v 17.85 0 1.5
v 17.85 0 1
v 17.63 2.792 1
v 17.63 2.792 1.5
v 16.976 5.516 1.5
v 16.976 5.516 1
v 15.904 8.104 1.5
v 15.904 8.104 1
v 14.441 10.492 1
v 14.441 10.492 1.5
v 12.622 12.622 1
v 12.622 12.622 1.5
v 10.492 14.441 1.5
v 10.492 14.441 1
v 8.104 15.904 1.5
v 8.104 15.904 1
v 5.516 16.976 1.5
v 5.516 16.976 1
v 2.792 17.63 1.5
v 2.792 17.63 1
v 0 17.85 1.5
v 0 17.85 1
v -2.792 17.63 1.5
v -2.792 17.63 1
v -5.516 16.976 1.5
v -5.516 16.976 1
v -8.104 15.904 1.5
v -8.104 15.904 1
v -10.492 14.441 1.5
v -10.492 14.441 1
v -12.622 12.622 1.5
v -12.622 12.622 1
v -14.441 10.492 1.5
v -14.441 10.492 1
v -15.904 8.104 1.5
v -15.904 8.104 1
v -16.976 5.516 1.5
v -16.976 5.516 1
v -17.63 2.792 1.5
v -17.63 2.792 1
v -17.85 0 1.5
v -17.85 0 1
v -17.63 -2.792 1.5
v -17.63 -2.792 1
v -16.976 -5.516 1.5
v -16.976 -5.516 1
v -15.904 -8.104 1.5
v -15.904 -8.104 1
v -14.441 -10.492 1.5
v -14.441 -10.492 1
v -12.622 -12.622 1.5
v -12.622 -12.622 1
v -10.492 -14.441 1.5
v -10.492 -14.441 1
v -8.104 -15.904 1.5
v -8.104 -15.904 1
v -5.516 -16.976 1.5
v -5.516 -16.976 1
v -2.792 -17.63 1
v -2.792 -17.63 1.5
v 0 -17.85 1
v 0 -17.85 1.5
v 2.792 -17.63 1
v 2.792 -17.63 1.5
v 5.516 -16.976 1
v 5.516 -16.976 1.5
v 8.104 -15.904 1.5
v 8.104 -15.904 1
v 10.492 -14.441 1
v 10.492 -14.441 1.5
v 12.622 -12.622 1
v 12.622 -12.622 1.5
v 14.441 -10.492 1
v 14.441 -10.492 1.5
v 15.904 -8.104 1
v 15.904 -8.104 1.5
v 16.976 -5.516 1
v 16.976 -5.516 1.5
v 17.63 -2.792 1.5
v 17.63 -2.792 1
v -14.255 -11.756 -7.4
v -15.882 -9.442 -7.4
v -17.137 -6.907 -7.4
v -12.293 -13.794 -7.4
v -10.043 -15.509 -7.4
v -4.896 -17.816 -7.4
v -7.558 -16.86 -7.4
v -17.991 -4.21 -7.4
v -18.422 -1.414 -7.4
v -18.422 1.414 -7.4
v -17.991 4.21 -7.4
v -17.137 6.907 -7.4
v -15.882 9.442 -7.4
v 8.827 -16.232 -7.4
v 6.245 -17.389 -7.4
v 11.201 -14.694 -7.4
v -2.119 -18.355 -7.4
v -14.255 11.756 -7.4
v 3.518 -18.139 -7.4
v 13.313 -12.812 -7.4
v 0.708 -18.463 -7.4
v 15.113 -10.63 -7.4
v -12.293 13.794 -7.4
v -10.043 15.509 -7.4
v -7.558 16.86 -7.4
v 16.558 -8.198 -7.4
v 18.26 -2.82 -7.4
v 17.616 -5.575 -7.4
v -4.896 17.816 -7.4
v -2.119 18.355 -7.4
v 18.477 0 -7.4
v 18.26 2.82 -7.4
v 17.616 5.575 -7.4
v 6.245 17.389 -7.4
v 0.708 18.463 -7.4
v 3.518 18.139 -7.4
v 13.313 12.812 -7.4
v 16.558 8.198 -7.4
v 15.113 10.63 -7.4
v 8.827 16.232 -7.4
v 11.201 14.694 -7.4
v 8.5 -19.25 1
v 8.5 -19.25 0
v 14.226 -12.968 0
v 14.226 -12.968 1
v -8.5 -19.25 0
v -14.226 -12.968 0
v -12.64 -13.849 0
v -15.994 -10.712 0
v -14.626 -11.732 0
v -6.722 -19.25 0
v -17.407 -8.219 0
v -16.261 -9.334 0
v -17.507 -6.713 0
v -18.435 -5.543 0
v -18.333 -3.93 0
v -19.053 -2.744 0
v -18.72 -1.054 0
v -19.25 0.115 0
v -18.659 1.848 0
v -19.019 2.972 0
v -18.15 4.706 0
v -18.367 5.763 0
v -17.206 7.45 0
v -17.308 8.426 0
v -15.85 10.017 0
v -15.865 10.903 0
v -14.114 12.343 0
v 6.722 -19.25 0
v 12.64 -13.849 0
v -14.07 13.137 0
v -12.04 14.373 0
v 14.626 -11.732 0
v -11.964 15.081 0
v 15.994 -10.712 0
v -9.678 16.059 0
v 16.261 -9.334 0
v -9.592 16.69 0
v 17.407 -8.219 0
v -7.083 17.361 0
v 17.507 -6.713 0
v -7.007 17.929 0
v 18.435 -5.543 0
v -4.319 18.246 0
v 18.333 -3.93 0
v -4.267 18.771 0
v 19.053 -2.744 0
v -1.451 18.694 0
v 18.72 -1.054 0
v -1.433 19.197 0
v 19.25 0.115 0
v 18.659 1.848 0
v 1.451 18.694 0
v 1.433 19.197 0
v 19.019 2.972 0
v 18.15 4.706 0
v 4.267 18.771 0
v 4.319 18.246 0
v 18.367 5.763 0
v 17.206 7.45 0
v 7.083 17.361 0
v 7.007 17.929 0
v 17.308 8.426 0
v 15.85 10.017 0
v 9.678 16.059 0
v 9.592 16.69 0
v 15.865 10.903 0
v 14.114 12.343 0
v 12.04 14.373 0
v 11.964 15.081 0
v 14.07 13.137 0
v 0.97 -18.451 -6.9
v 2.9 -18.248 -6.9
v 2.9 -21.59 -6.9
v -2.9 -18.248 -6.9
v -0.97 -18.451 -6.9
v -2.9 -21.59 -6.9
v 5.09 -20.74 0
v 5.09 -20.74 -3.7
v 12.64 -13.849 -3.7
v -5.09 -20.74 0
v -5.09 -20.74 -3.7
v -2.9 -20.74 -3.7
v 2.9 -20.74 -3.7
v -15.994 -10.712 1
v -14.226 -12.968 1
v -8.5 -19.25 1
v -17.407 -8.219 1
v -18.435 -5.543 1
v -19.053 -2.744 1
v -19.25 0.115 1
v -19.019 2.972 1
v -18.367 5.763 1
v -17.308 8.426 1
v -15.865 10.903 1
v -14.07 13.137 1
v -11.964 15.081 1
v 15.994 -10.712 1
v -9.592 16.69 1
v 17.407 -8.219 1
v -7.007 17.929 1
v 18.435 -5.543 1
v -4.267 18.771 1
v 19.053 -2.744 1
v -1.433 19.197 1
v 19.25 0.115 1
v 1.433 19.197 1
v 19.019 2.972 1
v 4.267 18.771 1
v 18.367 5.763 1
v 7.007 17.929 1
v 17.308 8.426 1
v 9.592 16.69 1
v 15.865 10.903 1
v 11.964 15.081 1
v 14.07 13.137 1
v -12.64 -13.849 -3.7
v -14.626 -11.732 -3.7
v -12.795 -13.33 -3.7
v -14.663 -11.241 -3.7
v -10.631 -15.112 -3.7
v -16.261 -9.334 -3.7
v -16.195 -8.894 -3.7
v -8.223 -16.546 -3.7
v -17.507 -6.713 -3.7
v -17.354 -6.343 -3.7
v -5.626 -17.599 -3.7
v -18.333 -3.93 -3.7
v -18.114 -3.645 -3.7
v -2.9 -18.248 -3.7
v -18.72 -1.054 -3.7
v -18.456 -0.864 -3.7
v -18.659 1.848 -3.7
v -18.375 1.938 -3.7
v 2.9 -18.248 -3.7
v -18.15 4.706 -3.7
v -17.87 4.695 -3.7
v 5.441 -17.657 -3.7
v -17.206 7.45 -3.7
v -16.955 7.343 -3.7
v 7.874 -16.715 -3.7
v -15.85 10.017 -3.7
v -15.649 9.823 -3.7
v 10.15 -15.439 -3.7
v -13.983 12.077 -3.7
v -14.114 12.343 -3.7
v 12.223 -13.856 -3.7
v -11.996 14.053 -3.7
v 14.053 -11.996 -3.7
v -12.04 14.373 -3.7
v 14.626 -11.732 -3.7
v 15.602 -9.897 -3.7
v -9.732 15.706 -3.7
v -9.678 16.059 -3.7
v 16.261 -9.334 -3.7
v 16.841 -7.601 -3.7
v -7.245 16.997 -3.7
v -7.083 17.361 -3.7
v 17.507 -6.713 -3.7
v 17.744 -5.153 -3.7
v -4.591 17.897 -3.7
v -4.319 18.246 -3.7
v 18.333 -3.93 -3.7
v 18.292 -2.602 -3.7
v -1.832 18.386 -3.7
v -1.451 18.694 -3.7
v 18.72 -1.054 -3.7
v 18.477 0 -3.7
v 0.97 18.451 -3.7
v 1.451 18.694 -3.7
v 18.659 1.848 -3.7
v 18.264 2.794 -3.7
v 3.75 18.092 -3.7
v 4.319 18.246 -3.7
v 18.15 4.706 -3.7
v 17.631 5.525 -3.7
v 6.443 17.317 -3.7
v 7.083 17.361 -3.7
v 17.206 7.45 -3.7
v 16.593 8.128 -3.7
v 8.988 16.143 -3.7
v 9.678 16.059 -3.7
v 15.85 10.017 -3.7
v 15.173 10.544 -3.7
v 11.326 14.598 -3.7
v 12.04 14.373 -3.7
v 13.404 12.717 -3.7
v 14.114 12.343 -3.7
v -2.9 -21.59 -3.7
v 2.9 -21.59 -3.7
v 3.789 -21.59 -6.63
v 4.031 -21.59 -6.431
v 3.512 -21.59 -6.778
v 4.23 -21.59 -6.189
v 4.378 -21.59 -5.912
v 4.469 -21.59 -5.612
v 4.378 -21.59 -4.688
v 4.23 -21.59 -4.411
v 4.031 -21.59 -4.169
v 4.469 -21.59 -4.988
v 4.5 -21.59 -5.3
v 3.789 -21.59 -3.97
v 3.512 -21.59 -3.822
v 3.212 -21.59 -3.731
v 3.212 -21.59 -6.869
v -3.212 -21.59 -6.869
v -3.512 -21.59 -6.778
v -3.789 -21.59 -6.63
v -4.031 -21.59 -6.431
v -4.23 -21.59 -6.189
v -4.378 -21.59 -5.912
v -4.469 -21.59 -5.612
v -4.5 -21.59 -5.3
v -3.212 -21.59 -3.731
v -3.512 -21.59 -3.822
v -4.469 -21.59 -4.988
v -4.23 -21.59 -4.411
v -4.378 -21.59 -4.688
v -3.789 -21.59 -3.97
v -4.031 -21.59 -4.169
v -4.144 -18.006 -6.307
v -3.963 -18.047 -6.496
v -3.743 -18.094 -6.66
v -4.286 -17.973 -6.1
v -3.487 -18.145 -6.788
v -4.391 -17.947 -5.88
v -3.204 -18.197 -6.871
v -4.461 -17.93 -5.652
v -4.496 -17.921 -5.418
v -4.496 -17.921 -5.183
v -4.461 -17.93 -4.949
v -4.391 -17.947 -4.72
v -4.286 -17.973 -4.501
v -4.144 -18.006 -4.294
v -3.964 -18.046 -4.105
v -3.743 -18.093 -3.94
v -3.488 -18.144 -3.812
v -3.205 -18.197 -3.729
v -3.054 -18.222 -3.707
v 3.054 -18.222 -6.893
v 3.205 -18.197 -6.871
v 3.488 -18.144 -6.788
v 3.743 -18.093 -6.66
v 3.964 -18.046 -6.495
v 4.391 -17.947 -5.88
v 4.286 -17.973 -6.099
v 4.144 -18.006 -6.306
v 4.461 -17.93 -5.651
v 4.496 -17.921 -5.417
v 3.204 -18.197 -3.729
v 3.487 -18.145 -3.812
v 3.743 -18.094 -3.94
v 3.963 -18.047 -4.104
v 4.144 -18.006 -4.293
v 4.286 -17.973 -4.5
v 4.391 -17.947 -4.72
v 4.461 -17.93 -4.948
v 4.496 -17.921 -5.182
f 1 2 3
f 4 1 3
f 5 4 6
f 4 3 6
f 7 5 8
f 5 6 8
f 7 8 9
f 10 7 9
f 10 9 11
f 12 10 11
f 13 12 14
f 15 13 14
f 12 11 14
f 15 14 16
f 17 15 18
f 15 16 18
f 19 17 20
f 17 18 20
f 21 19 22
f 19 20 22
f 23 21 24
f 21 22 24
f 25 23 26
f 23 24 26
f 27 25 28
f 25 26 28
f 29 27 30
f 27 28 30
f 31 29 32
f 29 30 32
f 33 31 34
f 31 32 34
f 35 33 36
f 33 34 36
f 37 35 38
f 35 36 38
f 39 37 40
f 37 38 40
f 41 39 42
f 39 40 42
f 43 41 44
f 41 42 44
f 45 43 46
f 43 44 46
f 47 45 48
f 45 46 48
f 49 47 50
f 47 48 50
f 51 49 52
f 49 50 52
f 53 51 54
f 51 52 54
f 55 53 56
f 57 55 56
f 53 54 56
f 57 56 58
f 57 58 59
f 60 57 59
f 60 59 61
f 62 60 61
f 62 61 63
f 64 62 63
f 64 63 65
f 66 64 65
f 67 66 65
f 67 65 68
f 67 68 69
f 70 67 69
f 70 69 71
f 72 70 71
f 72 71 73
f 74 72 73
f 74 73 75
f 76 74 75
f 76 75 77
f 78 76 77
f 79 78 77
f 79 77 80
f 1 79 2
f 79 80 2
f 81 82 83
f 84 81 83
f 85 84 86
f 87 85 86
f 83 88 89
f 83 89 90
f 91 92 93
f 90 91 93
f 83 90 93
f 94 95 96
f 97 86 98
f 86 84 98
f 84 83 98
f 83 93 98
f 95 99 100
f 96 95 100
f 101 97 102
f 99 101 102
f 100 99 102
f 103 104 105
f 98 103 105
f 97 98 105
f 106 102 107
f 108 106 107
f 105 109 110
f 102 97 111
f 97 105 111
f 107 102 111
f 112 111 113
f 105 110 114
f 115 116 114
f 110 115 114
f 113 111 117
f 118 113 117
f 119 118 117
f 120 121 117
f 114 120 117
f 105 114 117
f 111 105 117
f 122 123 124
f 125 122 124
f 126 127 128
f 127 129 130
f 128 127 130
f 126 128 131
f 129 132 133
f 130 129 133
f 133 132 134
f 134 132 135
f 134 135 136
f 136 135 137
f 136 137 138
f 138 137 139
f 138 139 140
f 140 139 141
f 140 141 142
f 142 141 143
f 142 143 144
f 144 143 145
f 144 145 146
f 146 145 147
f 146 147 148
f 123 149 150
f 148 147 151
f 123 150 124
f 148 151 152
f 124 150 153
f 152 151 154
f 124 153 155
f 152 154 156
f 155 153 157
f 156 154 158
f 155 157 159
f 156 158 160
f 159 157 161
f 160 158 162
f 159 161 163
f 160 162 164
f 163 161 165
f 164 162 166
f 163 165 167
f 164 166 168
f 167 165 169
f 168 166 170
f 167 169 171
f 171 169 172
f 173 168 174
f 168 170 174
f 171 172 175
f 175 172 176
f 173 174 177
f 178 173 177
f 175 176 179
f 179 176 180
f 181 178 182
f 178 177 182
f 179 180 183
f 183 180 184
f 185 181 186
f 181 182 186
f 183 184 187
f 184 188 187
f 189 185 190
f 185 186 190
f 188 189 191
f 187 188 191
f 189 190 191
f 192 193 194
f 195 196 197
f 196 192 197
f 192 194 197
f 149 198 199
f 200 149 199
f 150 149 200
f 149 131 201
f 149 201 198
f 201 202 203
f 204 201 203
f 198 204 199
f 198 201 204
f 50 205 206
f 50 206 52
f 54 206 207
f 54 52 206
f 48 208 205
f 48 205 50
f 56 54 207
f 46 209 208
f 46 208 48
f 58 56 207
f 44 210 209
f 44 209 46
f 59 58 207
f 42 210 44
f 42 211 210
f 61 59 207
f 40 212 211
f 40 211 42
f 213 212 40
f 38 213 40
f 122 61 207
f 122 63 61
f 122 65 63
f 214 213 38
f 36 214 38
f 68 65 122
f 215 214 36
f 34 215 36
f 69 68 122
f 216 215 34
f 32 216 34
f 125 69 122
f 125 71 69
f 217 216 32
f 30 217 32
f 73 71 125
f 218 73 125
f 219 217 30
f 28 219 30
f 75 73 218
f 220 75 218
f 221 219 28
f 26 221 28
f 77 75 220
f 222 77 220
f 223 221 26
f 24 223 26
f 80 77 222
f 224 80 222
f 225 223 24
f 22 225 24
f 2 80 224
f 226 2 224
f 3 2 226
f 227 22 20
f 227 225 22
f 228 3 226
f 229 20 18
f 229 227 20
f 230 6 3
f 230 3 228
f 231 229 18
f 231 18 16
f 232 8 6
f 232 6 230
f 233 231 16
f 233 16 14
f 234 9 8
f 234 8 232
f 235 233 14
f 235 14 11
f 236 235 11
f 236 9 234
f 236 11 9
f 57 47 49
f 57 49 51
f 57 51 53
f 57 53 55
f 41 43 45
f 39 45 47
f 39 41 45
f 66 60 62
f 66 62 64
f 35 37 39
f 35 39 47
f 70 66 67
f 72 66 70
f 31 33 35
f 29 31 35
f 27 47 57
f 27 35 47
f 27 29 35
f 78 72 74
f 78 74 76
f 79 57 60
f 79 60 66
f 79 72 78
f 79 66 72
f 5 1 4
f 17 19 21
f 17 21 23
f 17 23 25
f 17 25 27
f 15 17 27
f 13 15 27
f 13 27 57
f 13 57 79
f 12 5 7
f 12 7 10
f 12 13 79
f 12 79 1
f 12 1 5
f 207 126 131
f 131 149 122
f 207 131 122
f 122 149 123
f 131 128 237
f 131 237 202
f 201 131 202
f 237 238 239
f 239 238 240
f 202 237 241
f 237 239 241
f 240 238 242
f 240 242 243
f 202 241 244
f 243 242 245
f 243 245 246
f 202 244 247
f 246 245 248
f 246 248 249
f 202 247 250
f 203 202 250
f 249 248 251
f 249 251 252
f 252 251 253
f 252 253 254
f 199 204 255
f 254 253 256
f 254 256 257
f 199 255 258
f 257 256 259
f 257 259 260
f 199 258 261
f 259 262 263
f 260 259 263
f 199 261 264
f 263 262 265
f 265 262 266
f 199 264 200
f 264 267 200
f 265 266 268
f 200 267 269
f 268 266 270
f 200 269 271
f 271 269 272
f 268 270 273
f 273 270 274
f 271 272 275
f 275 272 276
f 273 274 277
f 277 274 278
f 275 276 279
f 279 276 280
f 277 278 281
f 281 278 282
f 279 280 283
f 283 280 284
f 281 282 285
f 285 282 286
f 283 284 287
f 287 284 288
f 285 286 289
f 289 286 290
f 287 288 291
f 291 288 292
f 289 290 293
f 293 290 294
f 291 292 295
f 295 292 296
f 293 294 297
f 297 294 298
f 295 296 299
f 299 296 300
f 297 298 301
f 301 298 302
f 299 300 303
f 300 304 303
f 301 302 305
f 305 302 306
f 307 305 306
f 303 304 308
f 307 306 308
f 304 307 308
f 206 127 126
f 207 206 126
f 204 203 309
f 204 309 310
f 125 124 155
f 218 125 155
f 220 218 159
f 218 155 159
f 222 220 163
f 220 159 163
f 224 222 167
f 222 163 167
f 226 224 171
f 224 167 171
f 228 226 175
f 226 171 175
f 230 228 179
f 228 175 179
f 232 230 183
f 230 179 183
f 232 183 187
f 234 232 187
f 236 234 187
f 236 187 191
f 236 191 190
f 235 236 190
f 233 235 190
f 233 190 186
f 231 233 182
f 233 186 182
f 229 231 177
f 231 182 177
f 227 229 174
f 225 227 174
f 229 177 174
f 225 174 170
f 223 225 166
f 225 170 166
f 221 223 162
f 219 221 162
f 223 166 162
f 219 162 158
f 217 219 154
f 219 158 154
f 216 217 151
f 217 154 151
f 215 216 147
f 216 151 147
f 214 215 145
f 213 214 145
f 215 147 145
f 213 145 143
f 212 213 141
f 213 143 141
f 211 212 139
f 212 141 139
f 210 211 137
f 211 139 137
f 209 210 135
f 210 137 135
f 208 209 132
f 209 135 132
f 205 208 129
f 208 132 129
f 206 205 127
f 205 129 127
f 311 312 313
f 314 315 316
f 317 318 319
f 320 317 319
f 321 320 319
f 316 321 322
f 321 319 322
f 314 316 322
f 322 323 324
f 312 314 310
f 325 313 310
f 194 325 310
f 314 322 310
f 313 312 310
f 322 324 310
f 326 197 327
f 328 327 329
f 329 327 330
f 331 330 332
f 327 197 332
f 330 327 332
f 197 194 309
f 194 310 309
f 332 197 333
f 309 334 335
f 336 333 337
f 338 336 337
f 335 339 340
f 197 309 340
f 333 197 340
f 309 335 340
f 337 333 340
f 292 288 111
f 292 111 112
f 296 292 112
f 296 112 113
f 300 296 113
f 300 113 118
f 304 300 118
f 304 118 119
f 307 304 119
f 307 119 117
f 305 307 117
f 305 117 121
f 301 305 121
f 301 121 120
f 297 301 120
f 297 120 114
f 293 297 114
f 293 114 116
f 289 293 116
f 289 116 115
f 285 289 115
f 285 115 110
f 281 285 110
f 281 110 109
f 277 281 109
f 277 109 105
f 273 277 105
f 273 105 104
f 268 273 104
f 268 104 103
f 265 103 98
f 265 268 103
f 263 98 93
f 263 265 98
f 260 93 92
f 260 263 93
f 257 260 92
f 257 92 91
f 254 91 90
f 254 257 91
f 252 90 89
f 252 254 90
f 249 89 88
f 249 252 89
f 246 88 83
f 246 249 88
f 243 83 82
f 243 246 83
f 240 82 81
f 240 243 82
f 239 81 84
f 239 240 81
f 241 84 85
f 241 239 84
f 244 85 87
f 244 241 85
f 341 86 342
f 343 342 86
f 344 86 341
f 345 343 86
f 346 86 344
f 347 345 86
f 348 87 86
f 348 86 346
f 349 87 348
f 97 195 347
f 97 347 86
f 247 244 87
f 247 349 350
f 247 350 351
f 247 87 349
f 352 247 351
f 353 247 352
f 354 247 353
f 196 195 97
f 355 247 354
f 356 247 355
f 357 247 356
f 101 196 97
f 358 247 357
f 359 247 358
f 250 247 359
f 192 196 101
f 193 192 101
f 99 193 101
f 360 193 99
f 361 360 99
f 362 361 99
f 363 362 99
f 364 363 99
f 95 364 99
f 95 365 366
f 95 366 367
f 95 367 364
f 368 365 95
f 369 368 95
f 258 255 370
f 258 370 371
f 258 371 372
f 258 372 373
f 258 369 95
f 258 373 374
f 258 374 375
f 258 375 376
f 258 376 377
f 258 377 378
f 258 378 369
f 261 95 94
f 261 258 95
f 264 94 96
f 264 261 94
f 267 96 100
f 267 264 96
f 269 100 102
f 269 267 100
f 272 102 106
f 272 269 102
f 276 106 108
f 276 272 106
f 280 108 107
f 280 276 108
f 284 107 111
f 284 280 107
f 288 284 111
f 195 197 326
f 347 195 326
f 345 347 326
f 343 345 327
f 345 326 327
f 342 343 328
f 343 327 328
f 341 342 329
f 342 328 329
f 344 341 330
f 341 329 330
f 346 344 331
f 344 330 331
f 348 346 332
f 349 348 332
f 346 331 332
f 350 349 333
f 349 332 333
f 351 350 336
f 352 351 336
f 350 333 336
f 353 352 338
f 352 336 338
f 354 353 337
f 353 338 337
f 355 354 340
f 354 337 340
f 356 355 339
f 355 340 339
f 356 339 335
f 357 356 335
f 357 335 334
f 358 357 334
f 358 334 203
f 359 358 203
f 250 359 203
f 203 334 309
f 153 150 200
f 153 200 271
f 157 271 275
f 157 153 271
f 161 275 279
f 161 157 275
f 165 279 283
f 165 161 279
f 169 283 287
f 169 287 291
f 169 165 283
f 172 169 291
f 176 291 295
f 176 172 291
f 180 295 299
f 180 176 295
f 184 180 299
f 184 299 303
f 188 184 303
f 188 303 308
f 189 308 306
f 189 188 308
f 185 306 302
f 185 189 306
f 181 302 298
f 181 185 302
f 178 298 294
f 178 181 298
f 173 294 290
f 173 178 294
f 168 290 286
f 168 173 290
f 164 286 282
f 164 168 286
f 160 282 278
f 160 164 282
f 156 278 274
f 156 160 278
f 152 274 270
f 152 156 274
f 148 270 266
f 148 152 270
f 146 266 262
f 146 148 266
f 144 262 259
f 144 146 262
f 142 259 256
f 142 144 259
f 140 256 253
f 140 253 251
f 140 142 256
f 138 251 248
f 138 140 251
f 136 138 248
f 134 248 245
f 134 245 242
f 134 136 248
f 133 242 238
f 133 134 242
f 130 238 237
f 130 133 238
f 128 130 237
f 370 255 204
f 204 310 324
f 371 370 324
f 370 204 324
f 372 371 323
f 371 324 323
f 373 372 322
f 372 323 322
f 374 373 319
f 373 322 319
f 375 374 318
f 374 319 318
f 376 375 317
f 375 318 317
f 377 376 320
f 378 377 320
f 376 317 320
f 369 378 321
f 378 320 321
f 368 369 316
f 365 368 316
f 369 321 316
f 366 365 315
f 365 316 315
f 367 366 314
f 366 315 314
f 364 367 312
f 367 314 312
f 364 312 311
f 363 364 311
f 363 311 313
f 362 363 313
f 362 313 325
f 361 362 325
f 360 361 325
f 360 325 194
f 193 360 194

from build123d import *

# Parameters (mm, degrees)
EXTRUDE_1_DEPTH             = 3.7
EXTRUDE_2_DEPTH             = 1
SKETCH_3_R                  = 17.85
EXTRUDE_3_DEPTH             = 0.5
SKETCH_4_R                  = 18.476621058
EXTRUDE_4_DEPTH             = 7.4
EXTRUDE_5_DEPTH             = 0.85
EXTRUDE_5_DIRECTION_2_REACH = 46.995


with BuildPart() as part:
    # ｽｹｯﾁ1 → ﾎﾞｽ - 押し出し1 (new body)
    with BuildSketch(Plane.XY):
        with BuildLine():
            Line((-12.64, -13.848931367), (-5.089846792, -20.74))
            Line((-5.089846792, -20.74), (5.089846792, -20.74))
            Line((5.089846792, -20.74), (12.64, -13.848931367))
            ThreePointArc((12.64, -13.848931367), (0, 18.75), (-12.64, -13.848931367))
        make_face()
    extrude(amount=-EXTRUDE_1_DEPTH)

    # ｽｹｯﾁ2 → ﾎﾞｽ - 押し出し2 (add)
    with BuildSketch(Plane.XY):
        with BuildLine():
            Line((-14.226252646, -12.968278052), (-8.5, -19.25))
            Line((-8.5, -19.25), (8.5, -19.25))
            Line((8.5, -19.25), (14.226252646, -12.968278052))
            ThreePointArc((14.226252646, -12.968278052), (0, 19.25), (-14.226252646, -12.968278052))
        make_face()
    extrude(amount=EXTRUDE_2_DEPTH)

    # ｽｹｯﾁ3 → ﾎﾞｽ - 押し出し3 (add)
    with BuildSketch(Plane.XY.offset(1)):
        Circle(SKETCH_3_R)
    extrude(amount=EXTRUDE_3_DEPTH)

    # ｽｹｯﾁ4 → ﾎﾞｽ - 押し出し4 (add)
    with BuildSketch(Plane.XY):
        Circle(SKETCH_4_R)
    extrude(amount=-EXTRUDE_4_DEPTH)

    # ｽｹｯﾁ5 → ﾎﾞｽ - 押し出し5 (add)
    with BuildSketch(Plane.XZ.offset(20.74)):
        with BuildLine():
            Line((-2.9, -3.7), (2.9, -3.7))
            ThreePointArc((2.9, -3.7), (4.5, -5.3), (2.9, -6.9))
            Line((2.9, -6.9), (-2.9, -6.9))
            ThreePointArc((-2.9, -6.9), (-4.5, -5.3), (-2.9, -3.7))
        make_face()
    extrude(amount=EXTRUDE_5_DEPTH)

    # ｽｹｯﾁ5 → ﾎﾞｽ - 押し出し5 direction 2 (add, up to next)
    with BuildSketch(Plane.XZ.offset(20.74), mode=Mode.PRIVATE) as extrude_5_direction_2_sk1:
        with BuildLine():
            Line((-2.9, -3.7), (2.9, -3.7))
            ThreePointArc((2.9, -3.7), (4.5, -5.3), (2.9, -6.9))
            Line((2.9, -6.9), (-2.9, -6.9))
            ThreePointArc((-2.9, -6.9), (-4.5, -5.3), (-2.9, -3.7))
        make_face()
    extrude_5_direction_2_tool1 = extrude(extrude_5_direction_2_sk1.sketch, amount=-EXTRUDE_5_DIRECTION_2_REACH, mode=Mode.PRIVATE) - part.part
    add(extrude_5_direction_2_tool1.solids().sort_by_distance((0, -20.74, -5.3))[0])


solid = part.part
